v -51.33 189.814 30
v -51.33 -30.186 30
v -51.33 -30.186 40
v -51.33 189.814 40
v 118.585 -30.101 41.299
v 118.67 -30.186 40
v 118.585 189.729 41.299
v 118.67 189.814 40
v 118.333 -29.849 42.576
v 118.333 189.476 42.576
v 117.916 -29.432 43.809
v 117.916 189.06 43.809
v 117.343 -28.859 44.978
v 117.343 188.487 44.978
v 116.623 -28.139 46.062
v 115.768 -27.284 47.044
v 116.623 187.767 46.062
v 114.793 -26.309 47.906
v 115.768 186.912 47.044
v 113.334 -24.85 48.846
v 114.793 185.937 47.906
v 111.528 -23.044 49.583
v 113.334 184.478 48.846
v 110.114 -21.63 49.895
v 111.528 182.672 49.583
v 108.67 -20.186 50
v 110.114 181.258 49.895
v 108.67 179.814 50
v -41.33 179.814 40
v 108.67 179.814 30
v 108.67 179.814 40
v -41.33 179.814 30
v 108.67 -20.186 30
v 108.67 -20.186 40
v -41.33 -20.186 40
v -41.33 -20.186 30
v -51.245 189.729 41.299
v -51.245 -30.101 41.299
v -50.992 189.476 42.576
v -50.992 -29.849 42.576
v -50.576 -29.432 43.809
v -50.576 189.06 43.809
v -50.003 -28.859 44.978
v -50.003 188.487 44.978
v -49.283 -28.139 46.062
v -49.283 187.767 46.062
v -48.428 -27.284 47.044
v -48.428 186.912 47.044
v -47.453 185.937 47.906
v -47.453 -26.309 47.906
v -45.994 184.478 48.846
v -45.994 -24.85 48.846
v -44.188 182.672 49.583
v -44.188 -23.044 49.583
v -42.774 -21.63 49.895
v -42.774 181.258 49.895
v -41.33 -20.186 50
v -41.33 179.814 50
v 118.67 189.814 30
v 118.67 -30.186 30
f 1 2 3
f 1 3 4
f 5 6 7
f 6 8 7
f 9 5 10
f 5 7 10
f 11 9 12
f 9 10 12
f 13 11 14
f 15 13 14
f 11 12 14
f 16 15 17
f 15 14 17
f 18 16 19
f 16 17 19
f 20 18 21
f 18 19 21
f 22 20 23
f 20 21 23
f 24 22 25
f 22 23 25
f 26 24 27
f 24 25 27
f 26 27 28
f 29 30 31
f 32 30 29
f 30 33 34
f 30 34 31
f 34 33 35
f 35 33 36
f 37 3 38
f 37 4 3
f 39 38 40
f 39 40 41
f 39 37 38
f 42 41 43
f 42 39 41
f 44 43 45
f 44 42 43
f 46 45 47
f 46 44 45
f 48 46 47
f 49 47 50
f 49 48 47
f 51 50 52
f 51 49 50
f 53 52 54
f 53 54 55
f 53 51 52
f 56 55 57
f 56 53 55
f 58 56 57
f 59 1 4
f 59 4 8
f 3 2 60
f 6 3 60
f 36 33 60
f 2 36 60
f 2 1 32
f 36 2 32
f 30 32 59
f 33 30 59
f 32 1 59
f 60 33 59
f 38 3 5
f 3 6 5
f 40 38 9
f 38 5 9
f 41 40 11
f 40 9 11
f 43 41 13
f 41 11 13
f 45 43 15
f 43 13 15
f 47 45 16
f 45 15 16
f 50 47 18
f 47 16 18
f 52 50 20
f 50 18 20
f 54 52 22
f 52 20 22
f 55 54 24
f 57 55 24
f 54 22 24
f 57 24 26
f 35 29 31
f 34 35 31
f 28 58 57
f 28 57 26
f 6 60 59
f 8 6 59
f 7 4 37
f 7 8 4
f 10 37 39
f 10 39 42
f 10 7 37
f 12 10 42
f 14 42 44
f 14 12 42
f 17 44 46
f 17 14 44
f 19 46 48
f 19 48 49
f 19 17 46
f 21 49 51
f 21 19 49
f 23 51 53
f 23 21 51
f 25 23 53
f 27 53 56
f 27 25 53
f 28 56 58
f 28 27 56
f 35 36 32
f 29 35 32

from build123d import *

# Parameters (mm, degrees)
SKETCH2_W           = 170
SKETCH2_H           = 220
BOSS_EXTRUDE1_DEPTH = 50
FILLET1_R           = 10
SKETCH3_W           = 150
SKETCH3_H           = 200
CUT_EXTRUDE1_DEPTH  = 50
SKETCH6_W           = 150
SKETCH6_H           = 200
BOSS_EXTRUDE2_DEPTH = 10
SKETCH7_W           = 170
SKETCH7_H           = 220
CUT_EXTRUDE3_DEPTH  = 30


with BuildPart() as part:
    # Sketch2 → Boss-Extrude1 (new body)
    with BuildSketch(Plane.XY):
        with Locations((33.670212766, 79.813829787)):
            Rectangle(SKETCH2_W, SKETCH2_H)
    extrude(amount=BOSS_EXTRUDE1_DEPTH)

    # Fillet1
    fillet1_edges = [part.edges().sort_by_distance(p)[0] for p in [
        (118.670212766, 79.813829787, 50),
        (33.670212766, 189.813829787, 50),
        (-51.329787234, 79.813829787, 50),
        (33.670212766, -30.186170213, 50),
    ]]
    fillet(fillet1_edges, radius=FILLET1_R)

    # Sketch3 → Cut-Extrude1 (cut)
    with BuildSketch(Plane(origin=(0, 0, 0), x_dir=(-1, 0, 0), z_dir=(0, 0, -1))):
        with Locations((-33.670212766, 79.813829787)):
            Rectangle(SKETCH3_W, SKETCH3_H)
    extrude(amount=-CUT_EXTRUDE1_DEPTH, mode=Mode.SUBTRACT)

    # Sketch6 → Boss-Extrude2 (add)
    with BuildSketch(Plane.XY.offset(40)):
        with Locations((33.670212766, 79.813829787)):
            Rectangle(SKETCH6_W, SKETCH6_H)
    extrude(amount=BOSS_EXTRUDE2_DEPTH)

    # Sketch7 → Cut-Extrude3 (cut)
    with BuildSketch(Plane.XY):
        with Locations((33.670212766, 79.813829787)):
            Rectangle(SKETCH7_W, SKETCH7_H)
    extrude(amount=CUT_EXTRUDE3_DEPTH, mode=Mode.SUBTRACT)


solid = part.part
